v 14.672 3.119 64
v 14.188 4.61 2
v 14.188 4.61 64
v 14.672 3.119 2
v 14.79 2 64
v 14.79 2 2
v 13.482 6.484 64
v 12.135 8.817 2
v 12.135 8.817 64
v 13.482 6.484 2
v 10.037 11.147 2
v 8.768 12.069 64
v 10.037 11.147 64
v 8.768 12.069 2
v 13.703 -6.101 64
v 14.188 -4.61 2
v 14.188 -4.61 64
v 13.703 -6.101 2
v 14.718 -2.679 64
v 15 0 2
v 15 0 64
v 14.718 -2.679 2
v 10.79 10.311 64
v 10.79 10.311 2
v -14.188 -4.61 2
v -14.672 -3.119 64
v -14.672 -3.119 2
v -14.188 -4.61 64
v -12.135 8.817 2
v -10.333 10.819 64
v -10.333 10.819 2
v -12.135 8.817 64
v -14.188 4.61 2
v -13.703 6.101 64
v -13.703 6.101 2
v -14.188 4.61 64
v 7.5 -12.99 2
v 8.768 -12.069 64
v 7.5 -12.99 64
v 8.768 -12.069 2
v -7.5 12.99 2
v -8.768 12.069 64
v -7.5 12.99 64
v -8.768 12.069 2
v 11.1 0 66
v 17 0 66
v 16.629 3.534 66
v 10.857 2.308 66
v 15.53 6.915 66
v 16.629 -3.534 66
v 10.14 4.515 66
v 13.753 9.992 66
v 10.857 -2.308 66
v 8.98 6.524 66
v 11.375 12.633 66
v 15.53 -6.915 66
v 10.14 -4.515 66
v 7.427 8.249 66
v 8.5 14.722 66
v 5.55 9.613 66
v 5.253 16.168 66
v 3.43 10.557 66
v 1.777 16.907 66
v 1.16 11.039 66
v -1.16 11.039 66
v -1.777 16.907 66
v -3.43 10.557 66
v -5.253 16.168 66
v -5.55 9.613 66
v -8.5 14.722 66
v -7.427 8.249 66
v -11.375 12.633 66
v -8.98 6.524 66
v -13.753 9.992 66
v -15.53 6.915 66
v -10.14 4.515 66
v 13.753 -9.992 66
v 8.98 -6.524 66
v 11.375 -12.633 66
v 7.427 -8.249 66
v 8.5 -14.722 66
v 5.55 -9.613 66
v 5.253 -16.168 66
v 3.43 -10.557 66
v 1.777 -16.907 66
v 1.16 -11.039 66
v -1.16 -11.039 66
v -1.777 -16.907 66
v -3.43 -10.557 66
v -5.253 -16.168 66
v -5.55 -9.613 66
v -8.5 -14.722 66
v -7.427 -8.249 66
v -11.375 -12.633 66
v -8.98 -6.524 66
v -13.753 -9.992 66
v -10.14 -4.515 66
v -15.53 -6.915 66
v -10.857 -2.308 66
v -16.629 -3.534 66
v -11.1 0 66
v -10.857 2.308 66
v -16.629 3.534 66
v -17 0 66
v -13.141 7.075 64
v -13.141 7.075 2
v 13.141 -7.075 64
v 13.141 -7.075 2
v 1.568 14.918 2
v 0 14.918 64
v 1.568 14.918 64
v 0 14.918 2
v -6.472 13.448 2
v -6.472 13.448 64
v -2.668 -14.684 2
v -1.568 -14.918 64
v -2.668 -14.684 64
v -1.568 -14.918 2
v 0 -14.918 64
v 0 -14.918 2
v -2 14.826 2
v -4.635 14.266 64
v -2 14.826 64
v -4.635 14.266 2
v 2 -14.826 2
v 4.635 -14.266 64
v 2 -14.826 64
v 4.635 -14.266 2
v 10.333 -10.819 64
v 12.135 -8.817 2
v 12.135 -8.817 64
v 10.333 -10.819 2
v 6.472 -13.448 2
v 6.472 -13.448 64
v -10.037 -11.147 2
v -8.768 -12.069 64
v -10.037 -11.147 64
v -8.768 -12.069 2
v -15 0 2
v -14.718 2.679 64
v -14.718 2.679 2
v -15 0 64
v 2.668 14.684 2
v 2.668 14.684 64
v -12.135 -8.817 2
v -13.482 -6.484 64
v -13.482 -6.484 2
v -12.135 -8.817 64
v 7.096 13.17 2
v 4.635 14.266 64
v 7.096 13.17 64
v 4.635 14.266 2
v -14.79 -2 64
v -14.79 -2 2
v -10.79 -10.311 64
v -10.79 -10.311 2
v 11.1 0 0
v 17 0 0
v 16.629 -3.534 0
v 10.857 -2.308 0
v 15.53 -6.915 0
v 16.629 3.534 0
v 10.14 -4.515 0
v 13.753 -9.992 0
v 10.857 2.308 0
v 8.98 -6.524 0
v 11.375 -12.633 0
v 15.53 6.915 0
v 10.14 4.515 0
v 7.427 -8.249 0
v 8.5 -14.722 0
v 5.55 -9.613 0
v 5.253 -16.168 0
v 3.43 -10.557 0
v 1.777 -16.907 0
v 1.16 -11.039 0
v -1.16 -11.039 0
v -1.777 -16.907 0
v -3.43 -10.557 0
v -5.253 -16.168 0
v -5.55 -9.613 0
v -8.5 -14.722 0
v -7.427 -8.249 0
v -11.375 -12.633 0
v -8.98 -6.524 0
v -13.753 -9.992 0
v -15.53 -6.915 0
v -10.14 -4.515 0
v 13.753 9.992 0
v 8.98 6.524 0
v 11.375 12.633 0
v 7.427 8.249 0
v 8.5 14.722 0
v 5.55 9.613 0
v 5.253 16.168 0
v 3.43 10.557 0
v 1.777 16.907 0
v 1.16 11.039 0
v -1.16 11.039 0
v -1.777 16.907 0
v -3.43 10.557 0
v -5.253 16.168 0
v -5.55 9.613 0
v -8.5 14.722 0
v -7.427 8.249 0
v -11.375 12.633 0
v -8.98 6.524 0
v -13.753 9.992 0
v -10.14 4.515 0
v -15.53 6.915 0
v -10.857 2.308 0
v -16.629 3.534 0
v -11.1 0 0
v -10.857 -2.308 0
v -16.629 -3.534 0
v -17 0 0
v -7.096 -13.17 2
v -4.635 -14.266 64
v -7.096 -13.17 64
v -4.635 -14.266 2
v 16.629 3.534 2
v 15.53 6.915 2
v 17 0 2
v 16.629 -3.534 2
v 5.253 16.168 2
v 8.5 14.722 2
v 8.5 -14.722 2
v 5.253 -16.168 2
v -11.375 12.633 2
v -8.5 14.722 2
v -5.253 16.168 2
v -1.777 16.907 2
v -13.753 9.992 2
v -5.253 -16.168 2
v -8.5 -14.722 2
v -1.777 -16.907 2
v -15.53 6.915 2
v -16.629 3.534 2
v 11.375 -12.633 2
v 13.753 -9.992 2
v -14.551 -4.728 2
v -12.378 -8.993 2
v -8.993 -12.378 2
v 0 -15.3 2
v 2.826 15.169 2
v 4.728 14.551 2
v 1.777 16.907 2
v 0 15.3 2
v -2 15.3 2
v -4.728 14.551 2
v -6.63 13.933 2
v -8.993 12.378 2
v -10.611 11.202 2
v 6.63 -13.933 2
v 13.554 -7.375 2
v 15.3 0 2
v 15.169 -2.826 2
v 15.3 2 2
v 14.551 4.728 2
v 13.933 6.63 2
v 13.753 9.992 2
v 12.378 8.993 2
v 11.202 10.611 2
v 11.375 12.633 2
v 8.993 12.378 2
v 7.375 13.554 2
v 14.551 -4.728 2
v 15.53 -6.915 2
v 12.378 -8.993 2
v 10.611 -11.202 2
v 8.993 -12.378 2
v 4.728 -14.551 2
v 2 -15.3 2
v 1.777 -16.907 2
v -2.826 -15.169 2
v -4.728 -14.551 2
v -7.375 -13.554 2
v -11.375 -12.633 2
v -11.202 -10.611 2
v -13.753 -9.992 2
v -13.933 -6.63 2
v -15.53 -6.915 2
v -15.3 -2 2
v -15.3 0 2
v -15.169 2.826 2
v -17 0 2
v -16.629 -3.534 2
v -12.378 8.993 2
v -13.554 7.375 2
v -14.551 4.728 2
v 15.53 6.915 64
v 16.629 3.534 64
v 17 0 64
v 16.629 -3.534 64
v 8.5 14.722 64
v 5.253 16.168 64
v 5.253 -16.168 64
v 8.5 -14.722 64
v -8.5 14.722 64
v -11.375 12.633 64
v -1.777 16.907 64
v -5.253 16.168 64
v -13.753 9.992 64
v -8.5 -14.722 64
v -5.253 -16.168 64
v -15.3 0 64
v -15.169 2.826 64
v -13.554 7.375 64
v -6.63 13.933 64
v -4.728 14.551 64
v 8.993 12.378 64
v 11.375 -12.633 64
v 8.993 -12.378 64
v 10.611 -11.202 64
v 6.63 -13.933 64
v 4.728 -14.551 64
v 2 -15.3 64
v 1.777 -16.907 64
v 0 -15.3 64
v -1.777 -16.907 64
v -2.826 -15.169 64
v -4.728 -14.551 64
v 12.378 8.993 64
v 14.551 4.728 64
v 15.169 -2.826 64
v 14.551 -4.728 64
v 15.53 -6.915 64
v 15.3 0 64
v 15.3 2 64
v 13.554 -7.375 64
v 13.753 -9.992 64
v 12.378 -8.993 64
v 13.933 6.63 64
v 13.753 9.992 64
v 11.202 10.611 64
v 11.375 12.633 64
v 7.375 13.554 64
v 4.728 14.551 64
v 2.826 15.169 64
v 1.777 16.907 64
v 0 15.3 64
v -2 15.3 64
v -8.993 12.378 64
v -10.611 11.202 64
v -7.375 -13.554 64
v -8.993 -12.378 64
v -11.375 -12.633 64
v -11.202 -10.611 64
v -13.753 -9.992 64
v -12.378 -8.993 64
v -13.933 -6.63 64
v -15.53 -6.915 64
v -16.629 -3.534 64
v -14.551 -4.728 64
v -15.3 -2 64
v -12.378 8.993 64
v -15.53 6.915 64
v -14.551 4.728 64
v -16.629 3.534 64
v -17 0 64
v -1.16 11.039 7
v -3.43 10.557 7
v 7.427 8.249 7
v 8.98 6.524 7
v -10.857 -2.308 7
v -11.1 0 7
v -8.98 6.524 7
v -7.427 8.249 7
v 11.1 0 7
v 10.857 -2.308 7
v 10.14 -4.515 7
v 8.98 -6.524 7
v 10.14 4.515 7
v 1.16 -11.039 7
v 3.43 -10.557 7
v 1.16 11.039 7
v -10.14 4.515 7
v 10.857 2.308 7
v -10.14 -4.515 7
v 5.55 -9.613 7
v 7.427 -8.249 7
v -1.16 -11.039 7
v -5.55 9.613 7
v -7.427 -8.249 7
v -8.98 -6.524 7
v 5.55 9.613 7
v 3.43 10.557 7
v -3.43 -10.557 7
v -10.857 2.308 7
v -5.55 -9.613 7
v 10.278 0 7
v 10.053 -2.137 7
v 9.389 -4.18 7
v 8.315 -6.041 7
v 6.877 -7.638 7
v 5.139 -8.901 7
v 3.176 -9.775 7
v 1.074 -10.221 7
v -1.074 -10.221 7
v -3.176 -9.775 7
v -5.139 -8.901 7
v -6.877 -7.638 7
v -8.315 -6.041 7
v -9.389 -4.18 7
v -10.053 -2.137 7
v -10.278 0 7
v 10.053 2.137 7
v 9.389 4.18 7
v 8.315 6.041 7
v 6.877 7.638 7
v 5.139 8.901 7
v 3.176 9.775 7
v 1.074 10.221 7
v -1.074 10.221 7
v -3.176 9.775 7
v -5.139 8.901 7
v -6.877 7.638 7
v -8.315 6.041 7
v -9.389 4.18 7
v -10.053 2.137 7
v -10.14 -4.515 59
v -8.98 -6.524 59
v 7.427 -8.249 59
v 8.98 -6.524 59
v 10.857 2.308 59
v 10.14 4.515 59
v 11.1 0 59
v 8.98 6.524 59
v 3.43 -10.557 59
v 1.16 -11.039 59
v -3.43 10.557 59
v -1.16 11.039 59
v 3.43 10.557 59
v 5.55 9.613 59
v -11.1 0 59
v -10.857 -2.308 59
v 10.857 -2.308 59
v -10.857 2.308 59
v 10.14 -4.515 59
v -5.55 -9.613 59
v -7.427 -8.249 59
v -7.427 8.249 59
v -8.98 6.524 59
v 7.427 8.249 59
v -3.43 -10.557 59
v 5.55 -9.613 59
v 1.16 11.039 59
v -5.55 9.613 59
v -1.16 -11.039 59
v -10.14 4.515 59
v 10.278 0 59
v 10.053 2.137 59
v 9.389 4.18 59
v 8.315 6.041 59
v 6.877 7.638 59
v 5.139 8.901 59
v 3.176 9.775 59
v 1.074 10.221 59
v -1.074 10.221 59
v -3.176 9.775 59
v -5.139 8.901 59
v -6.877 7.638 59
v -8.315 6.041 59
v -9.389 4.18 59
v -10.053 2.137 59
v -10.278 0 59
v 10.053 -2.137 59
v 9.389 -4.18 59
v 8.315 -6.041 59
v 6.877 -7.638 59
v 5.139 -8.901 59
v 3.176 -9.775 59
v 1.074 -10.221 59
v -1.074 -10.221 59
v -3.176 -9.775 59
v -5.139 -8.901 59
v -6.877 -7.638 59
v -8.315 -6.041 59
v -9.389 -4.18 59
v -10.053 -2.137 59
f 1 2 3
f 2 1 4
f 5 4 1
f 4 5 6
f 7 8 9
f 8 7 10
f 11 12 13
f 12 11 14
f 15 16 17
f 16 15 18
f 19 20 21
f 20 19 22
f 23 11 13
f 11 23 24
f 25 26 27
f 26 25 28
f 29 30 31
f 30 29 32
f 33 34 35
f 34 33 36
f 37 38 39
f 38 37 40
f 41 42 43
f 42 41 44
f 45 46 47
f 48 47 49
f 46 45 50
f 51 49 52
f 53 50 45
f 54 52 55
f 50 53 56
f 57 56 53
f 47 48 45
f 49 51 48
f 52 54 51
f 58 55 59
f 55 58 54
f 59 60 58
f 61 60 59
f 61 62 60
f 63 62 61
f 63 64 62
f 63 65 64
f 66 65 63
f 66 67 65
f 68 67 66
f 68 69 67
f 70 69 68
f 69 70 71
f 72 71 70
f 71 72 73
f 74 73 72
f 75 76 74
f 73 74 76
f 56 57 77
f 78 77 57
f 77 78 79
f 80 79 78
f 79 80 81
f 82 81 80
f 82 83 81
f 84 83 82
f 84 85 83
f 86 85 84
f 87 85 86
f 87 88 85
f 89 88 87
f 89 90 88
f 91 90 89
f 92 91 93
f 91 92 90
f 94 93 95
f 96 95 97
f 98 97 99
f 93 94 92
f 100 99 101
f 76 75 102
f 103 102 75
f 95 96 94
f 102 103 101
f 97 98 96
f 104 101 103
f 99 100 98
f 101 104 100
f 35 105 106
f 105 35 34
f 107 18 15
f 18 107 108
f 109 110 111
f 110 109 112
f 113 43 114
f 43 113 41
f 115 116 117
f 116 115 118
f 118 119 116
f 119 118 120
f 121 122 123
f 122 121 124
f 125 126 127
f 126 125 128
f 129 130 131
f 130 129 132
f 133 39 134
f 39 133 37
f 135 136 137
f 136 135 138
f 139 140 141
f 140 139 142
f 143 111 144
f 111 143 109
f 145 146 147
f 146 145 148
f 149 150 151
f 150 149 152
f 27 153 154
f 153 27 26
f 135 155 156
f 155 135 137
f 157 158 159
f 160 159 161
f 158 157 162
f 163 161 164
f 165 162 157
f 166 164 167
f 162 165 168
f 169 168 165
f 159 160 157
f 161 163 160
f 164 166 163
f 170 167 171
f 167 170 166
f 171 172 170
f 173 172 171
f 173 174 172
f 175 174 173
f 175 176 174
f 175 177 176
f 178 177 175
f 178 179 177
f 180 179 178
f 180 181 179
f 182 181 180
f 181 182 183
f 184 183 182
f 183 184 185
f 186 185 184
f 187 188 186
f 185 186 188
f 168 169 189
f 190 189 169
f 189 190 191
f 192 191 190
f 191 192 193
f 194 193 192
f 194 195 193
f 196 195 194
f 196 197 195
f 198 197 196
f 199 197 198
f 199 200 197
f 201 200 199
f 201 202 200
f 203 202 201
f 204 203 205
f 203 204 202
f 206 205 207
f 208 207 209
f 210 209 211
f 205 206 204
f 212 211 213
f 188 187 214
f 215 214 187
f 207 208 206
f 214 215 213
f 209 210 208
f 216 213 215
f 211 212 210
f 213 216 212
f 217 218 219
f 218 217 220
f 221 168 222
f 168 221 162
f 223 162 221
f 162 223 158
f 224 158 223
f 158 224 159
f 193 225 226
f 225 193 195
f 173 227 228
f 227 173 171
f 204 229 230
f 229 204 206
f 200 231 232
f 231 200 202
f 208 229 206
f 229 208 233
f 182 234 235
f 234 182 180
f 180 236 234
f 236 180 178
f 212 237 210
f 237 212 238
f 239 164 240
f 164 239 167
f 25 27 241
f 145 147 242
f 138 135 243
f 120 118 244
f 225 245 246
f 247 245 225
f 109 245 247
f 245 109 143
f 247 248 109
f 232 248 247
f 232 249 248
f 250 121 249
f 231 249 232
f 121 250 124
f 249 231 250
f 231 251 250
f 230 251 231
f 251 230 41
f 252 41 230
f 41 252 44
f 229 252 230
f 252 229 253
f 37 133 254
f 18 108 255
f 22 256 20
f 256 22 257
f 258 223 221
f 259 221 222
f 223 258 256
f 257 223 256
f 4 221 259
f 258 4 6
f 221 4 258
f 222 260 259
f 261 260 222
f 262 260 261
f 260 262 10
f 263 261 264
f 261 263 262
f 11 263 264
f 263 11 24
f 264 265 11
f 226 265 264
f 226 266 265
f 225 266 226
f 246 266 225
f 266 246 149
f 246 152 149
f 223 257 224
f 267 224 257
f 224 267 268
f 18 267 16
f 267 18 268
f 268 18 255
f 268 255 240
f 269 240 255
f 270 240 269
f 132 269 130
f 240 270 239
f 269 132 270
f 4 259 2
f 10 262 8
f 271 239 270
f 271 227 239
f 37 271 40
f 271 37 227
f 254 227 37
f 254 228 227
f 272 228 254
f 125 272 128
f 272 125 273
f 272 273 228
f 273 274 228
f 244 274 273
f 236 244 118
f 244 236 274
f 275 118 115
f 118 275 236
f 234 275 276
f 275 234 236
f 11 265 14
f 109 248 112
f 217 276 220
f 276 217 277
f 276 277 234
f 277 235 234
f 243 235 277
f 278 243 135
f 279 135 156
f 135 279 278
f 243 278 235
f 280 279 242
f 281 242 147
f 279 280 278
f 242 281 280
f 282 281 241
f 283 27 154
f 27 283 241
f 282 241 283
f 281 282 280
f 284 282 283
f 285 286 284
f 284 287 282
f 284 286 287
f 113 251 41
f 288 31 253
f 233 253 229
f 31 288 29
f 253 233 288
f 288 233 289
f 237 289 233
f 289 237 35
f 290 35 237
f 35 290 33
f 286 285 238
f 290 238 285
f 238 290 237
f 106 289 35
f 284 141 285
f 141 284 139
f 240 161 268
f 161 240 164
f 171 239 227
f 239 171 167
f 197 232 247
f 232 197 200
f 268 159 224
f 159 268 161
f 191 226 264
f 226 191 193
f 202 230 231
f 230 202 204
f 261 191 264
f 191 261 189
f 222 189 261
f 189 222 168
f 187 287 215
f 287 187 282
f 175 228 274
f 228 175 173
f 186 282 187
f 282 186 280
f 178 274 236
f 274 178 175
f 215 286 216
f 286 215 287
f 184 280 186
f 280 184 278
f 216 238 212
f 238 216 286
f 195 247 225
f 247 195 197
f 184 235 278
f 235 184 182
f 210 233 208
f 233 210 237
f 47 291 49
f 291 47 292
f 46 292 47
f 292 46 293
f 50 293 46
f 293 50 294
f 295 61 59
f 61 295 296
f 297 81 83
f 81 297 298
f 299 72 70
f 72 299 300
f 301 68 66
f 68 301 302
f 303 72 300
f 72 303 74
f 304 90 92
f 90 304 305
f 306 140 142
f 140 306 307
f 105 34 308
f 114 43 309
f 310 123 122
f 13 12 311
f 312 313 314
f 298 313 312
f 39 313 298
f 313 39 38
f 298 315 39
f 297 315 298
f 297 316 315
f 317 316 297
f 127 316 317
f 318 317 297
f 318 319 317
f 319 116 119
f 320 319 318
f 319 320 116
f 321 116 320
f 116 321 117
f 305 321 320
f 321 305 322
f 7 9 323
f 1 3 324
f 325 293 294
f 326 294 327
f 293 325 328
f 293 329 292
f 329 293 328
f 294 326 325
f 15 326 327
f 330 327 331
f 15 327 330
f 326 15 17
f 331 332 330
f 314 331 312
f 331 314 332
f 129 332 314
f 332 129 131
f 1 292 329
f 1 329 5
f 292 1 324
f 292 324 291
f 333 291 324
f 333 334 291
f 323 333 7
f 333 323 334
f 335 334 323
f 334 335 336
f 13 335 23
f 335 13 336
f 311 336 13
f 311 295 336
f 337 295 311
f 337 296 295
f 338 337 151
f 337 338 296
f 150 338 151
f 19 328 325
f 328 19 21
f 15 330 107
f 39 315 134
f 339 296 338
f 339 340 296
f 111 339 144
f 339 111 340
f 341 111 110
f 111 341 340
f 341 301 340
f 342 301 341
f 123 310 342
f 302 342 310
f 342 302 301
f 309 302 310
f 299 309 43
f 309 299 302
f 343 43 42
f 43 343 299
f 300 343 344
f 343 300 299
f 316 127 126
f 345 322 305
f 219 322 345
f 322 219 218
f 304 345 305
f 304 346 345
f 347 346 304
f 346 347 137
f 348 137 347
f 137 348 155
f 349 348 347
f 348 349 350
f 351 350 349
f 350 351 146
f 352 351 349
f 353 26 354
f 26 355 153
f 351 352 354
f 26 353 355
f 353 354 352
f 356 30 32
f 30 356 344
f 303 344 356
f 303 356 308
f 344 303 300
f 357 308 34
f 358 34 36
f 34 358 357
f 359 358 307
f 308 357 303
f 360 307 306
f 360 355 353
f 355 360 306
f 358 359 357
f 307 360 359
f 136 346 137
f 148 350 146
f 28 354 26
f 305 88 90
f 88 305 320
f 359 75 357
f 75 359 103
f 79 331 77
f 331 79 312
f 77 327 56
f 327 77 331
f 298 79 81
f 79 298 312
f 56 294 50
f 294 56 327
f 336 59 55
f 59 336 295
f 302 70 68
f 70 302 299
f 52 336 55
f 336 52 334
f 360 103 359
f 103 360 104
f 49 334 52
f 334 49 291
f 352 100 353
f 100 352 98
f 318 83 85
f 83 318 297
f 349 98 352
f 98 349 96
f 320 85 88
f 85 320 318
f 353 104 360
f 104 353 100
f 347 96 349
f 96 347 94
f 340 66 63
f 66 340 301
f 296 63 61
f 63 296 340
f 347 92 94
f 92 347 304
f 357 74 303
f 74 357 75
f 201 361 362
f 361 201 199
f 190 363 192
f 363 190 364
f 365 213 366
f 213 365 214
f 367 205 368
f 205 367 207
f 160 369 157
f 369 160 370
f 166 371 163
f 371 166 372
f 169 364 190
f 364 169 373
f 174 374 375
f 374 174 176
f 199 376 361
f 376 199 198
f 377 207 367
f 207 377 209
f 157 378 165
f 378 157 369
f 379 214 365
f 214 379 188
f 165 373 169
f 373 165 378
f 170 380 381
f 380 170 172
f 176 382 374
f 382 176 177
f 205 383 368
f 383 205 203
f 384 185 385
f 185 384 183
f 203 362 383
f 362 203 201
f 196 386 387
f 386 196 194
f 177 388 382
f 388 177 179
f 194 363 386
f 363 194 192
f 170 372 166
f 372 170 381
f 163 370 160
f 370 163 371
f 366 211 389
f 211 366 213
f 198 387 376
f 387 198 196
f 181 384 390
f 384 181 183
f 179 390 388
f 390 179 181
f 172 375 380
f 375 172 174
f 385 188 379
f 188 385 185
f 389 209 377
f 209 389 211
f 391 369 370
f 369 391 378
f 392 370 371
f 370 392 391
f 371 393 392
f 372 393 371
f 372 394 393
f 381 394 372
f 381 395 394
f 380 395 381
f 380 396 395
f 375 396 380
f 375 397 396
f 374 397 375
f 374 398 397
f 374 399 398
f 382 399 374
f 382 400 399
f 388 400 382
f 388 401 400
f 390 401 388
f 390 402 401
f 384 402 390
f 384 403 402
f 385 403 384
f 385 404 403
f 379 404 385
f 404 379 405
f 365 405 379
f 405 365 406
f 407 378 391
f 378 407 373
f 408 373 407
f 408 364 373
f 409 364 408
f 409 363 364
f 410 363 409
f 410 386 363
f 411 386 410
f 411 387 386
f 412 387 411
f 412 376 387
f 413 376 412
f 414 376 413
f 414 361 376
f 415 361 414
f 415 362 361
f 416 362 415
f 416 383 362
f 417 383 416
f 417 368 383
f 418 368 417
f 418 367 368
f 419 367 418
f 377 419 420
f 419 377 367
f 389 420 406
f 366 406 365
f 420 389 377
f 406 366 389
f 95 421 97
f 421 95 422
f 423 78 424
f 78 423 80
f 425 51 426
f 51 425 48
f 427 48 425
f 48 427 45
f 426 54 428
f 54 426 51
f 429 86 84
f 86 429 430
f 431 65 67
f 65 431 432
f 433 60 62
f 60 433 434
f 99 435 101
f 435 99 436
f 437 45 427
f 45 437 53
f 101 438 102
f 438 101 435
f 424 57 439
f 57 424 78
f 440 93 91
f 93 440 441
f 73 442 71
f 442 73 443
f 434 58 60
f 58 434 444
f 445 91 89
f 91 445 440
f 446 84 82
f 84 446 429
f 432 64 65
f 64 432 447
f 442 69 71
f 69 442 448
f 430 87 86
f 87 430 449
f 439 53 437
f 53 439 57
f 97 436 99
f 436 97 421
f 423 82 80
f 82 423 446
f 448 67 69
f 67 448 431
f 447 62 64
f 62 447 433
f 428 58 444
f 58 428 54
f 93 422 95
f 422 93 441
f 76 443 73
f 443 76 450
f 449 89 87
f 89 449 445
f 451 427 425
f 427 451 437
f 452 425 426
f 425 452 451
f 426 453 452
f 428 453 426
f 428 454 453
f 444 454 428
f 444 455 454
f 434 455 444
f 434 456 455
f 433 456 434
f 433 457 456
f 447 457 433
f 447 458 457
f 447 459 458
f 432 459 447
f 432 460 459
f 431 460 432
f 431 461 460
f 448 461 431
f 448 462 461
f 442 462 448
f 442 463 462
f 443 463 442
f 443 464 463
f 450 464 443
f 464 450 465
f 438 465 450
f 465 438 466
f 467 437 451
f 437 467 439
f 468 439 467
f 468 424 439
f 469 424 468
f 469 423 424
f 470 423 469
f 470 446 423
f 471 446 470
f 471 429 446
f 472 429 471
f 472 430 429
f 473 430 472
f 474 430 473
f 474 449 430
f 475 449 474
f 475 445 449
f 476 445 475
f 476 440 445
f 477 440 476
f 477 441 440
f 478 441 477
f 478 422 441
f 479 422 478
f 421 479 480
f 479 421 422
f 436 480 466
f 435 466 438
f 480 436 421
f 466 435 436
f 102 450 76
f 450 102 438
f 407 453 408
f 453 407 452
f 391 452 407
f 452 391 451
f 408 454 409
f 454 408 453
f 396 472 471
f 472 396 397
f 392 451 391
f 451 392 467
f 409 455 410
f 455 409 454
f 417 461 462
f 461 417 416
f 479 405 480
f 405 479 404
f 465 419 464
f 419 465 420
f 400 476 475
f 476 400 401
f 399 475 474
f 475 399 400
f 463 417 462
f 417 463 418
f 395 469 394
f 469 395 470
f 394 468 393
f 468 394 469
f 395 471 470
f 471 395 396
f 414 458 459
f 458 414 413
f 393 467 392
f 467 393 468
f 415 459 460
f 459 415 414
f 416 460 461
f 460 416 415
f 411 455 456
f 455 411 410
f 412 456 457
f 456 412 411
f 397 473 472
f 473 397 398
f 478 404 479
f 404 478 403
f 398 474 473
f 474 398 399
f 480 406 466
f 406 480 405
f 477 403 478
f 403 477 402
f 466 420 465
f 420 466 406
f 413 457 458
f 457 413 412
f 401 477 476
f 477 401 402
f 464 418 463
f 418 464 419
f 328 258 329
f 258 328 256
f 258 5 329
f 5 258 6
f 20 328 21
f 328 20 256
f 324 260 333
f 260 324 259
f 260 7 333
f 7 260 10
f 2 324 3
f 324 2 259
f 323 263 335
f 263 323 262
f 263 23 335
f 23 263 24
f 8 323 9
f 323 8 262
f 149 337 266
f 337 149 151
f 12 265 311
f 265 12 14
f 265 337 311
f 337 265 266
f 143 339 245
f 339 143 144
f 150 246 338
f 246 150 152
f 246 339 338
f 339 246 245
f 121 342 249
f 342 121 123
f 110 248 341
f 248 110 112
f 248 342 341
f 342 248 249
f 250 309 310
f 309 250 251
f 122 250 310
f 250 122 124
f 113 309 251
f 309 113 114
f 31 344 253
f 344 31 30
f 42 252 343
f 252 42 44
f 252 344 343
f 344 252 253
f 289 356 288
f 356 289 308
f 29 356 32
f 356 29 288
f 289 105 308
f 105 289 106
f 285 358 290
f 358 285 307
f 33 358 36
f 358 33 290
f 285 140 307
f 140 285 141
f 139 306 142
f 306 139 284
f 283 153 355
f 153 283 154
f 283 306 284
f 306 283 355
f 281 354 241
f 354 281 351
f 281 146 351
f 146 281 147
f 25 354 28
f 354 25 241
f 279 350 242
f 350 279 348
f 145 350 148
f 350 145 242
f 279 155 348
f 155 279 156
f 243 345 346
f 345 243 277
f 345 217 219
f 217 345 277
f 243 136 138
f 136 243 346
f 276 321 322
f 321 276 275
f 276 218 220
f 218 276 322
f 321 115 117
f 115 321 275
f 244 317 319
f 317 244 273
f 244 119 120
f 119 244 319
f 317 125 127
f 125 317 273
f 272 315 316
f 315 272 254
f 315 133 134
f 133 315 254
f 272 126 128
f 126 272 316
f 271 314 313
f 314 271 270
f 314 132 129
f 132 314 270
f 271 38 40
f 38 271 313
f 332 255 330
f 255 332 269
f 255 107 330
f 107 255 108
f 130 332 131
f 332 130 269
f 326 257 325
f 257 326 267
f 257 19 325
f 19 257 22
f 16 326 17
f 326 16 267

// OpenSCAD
// Jim Samson
// Spool for rat project 
// November 13, 2018

offsetForEnds=6;

beltHeight=60+(offsetForEnds); // millimeters
diameterForBelt=30;

diameterForEdgesHeight=2;
diameterForEdges = diameterForBelt + 4;

bearingDiameter=22.2;
bearingHeight=8;

spoolHolder();

module spoolHolder() {
    union() {
        difference() {
            spool();
            bearings();
            middleShaft();
        }
        gripHolders();
    }
}

module gripHolders() {
    n=20;
    for(i=[0:n]) {
        rotate([0,0,i*360/n]) {
            translate([(diameterForBelt/2)-1.7,0,2]) { 
                cube([2,2,beltHeight-4]);
            }
        }
    }
}

module middleShaft() {
    cylinder(d=bearingDiameter/1.08,h=beltHeight);
}

module bearings() {
    translate([0,0,-1]) {
        cylinder(d=bearingDiameter,h=bearingHeight);
    }
    
    translate([0,0,beltHeight-bearingHeight+1]) {
        cylinder(d=bearingDiameter,h=bearingHeight);
    }
}

module spool() {
    cylinder(d=diameterForBelt,h=beltHeight);
    
    cylinder(d=diameterForEdges,h=diameterForEdgesHeight);
    translate([0,0,beltHeight-2]) {
        cylinder(d=diameterForEdges,h=diameterForEdgesHeight);
    }
}
